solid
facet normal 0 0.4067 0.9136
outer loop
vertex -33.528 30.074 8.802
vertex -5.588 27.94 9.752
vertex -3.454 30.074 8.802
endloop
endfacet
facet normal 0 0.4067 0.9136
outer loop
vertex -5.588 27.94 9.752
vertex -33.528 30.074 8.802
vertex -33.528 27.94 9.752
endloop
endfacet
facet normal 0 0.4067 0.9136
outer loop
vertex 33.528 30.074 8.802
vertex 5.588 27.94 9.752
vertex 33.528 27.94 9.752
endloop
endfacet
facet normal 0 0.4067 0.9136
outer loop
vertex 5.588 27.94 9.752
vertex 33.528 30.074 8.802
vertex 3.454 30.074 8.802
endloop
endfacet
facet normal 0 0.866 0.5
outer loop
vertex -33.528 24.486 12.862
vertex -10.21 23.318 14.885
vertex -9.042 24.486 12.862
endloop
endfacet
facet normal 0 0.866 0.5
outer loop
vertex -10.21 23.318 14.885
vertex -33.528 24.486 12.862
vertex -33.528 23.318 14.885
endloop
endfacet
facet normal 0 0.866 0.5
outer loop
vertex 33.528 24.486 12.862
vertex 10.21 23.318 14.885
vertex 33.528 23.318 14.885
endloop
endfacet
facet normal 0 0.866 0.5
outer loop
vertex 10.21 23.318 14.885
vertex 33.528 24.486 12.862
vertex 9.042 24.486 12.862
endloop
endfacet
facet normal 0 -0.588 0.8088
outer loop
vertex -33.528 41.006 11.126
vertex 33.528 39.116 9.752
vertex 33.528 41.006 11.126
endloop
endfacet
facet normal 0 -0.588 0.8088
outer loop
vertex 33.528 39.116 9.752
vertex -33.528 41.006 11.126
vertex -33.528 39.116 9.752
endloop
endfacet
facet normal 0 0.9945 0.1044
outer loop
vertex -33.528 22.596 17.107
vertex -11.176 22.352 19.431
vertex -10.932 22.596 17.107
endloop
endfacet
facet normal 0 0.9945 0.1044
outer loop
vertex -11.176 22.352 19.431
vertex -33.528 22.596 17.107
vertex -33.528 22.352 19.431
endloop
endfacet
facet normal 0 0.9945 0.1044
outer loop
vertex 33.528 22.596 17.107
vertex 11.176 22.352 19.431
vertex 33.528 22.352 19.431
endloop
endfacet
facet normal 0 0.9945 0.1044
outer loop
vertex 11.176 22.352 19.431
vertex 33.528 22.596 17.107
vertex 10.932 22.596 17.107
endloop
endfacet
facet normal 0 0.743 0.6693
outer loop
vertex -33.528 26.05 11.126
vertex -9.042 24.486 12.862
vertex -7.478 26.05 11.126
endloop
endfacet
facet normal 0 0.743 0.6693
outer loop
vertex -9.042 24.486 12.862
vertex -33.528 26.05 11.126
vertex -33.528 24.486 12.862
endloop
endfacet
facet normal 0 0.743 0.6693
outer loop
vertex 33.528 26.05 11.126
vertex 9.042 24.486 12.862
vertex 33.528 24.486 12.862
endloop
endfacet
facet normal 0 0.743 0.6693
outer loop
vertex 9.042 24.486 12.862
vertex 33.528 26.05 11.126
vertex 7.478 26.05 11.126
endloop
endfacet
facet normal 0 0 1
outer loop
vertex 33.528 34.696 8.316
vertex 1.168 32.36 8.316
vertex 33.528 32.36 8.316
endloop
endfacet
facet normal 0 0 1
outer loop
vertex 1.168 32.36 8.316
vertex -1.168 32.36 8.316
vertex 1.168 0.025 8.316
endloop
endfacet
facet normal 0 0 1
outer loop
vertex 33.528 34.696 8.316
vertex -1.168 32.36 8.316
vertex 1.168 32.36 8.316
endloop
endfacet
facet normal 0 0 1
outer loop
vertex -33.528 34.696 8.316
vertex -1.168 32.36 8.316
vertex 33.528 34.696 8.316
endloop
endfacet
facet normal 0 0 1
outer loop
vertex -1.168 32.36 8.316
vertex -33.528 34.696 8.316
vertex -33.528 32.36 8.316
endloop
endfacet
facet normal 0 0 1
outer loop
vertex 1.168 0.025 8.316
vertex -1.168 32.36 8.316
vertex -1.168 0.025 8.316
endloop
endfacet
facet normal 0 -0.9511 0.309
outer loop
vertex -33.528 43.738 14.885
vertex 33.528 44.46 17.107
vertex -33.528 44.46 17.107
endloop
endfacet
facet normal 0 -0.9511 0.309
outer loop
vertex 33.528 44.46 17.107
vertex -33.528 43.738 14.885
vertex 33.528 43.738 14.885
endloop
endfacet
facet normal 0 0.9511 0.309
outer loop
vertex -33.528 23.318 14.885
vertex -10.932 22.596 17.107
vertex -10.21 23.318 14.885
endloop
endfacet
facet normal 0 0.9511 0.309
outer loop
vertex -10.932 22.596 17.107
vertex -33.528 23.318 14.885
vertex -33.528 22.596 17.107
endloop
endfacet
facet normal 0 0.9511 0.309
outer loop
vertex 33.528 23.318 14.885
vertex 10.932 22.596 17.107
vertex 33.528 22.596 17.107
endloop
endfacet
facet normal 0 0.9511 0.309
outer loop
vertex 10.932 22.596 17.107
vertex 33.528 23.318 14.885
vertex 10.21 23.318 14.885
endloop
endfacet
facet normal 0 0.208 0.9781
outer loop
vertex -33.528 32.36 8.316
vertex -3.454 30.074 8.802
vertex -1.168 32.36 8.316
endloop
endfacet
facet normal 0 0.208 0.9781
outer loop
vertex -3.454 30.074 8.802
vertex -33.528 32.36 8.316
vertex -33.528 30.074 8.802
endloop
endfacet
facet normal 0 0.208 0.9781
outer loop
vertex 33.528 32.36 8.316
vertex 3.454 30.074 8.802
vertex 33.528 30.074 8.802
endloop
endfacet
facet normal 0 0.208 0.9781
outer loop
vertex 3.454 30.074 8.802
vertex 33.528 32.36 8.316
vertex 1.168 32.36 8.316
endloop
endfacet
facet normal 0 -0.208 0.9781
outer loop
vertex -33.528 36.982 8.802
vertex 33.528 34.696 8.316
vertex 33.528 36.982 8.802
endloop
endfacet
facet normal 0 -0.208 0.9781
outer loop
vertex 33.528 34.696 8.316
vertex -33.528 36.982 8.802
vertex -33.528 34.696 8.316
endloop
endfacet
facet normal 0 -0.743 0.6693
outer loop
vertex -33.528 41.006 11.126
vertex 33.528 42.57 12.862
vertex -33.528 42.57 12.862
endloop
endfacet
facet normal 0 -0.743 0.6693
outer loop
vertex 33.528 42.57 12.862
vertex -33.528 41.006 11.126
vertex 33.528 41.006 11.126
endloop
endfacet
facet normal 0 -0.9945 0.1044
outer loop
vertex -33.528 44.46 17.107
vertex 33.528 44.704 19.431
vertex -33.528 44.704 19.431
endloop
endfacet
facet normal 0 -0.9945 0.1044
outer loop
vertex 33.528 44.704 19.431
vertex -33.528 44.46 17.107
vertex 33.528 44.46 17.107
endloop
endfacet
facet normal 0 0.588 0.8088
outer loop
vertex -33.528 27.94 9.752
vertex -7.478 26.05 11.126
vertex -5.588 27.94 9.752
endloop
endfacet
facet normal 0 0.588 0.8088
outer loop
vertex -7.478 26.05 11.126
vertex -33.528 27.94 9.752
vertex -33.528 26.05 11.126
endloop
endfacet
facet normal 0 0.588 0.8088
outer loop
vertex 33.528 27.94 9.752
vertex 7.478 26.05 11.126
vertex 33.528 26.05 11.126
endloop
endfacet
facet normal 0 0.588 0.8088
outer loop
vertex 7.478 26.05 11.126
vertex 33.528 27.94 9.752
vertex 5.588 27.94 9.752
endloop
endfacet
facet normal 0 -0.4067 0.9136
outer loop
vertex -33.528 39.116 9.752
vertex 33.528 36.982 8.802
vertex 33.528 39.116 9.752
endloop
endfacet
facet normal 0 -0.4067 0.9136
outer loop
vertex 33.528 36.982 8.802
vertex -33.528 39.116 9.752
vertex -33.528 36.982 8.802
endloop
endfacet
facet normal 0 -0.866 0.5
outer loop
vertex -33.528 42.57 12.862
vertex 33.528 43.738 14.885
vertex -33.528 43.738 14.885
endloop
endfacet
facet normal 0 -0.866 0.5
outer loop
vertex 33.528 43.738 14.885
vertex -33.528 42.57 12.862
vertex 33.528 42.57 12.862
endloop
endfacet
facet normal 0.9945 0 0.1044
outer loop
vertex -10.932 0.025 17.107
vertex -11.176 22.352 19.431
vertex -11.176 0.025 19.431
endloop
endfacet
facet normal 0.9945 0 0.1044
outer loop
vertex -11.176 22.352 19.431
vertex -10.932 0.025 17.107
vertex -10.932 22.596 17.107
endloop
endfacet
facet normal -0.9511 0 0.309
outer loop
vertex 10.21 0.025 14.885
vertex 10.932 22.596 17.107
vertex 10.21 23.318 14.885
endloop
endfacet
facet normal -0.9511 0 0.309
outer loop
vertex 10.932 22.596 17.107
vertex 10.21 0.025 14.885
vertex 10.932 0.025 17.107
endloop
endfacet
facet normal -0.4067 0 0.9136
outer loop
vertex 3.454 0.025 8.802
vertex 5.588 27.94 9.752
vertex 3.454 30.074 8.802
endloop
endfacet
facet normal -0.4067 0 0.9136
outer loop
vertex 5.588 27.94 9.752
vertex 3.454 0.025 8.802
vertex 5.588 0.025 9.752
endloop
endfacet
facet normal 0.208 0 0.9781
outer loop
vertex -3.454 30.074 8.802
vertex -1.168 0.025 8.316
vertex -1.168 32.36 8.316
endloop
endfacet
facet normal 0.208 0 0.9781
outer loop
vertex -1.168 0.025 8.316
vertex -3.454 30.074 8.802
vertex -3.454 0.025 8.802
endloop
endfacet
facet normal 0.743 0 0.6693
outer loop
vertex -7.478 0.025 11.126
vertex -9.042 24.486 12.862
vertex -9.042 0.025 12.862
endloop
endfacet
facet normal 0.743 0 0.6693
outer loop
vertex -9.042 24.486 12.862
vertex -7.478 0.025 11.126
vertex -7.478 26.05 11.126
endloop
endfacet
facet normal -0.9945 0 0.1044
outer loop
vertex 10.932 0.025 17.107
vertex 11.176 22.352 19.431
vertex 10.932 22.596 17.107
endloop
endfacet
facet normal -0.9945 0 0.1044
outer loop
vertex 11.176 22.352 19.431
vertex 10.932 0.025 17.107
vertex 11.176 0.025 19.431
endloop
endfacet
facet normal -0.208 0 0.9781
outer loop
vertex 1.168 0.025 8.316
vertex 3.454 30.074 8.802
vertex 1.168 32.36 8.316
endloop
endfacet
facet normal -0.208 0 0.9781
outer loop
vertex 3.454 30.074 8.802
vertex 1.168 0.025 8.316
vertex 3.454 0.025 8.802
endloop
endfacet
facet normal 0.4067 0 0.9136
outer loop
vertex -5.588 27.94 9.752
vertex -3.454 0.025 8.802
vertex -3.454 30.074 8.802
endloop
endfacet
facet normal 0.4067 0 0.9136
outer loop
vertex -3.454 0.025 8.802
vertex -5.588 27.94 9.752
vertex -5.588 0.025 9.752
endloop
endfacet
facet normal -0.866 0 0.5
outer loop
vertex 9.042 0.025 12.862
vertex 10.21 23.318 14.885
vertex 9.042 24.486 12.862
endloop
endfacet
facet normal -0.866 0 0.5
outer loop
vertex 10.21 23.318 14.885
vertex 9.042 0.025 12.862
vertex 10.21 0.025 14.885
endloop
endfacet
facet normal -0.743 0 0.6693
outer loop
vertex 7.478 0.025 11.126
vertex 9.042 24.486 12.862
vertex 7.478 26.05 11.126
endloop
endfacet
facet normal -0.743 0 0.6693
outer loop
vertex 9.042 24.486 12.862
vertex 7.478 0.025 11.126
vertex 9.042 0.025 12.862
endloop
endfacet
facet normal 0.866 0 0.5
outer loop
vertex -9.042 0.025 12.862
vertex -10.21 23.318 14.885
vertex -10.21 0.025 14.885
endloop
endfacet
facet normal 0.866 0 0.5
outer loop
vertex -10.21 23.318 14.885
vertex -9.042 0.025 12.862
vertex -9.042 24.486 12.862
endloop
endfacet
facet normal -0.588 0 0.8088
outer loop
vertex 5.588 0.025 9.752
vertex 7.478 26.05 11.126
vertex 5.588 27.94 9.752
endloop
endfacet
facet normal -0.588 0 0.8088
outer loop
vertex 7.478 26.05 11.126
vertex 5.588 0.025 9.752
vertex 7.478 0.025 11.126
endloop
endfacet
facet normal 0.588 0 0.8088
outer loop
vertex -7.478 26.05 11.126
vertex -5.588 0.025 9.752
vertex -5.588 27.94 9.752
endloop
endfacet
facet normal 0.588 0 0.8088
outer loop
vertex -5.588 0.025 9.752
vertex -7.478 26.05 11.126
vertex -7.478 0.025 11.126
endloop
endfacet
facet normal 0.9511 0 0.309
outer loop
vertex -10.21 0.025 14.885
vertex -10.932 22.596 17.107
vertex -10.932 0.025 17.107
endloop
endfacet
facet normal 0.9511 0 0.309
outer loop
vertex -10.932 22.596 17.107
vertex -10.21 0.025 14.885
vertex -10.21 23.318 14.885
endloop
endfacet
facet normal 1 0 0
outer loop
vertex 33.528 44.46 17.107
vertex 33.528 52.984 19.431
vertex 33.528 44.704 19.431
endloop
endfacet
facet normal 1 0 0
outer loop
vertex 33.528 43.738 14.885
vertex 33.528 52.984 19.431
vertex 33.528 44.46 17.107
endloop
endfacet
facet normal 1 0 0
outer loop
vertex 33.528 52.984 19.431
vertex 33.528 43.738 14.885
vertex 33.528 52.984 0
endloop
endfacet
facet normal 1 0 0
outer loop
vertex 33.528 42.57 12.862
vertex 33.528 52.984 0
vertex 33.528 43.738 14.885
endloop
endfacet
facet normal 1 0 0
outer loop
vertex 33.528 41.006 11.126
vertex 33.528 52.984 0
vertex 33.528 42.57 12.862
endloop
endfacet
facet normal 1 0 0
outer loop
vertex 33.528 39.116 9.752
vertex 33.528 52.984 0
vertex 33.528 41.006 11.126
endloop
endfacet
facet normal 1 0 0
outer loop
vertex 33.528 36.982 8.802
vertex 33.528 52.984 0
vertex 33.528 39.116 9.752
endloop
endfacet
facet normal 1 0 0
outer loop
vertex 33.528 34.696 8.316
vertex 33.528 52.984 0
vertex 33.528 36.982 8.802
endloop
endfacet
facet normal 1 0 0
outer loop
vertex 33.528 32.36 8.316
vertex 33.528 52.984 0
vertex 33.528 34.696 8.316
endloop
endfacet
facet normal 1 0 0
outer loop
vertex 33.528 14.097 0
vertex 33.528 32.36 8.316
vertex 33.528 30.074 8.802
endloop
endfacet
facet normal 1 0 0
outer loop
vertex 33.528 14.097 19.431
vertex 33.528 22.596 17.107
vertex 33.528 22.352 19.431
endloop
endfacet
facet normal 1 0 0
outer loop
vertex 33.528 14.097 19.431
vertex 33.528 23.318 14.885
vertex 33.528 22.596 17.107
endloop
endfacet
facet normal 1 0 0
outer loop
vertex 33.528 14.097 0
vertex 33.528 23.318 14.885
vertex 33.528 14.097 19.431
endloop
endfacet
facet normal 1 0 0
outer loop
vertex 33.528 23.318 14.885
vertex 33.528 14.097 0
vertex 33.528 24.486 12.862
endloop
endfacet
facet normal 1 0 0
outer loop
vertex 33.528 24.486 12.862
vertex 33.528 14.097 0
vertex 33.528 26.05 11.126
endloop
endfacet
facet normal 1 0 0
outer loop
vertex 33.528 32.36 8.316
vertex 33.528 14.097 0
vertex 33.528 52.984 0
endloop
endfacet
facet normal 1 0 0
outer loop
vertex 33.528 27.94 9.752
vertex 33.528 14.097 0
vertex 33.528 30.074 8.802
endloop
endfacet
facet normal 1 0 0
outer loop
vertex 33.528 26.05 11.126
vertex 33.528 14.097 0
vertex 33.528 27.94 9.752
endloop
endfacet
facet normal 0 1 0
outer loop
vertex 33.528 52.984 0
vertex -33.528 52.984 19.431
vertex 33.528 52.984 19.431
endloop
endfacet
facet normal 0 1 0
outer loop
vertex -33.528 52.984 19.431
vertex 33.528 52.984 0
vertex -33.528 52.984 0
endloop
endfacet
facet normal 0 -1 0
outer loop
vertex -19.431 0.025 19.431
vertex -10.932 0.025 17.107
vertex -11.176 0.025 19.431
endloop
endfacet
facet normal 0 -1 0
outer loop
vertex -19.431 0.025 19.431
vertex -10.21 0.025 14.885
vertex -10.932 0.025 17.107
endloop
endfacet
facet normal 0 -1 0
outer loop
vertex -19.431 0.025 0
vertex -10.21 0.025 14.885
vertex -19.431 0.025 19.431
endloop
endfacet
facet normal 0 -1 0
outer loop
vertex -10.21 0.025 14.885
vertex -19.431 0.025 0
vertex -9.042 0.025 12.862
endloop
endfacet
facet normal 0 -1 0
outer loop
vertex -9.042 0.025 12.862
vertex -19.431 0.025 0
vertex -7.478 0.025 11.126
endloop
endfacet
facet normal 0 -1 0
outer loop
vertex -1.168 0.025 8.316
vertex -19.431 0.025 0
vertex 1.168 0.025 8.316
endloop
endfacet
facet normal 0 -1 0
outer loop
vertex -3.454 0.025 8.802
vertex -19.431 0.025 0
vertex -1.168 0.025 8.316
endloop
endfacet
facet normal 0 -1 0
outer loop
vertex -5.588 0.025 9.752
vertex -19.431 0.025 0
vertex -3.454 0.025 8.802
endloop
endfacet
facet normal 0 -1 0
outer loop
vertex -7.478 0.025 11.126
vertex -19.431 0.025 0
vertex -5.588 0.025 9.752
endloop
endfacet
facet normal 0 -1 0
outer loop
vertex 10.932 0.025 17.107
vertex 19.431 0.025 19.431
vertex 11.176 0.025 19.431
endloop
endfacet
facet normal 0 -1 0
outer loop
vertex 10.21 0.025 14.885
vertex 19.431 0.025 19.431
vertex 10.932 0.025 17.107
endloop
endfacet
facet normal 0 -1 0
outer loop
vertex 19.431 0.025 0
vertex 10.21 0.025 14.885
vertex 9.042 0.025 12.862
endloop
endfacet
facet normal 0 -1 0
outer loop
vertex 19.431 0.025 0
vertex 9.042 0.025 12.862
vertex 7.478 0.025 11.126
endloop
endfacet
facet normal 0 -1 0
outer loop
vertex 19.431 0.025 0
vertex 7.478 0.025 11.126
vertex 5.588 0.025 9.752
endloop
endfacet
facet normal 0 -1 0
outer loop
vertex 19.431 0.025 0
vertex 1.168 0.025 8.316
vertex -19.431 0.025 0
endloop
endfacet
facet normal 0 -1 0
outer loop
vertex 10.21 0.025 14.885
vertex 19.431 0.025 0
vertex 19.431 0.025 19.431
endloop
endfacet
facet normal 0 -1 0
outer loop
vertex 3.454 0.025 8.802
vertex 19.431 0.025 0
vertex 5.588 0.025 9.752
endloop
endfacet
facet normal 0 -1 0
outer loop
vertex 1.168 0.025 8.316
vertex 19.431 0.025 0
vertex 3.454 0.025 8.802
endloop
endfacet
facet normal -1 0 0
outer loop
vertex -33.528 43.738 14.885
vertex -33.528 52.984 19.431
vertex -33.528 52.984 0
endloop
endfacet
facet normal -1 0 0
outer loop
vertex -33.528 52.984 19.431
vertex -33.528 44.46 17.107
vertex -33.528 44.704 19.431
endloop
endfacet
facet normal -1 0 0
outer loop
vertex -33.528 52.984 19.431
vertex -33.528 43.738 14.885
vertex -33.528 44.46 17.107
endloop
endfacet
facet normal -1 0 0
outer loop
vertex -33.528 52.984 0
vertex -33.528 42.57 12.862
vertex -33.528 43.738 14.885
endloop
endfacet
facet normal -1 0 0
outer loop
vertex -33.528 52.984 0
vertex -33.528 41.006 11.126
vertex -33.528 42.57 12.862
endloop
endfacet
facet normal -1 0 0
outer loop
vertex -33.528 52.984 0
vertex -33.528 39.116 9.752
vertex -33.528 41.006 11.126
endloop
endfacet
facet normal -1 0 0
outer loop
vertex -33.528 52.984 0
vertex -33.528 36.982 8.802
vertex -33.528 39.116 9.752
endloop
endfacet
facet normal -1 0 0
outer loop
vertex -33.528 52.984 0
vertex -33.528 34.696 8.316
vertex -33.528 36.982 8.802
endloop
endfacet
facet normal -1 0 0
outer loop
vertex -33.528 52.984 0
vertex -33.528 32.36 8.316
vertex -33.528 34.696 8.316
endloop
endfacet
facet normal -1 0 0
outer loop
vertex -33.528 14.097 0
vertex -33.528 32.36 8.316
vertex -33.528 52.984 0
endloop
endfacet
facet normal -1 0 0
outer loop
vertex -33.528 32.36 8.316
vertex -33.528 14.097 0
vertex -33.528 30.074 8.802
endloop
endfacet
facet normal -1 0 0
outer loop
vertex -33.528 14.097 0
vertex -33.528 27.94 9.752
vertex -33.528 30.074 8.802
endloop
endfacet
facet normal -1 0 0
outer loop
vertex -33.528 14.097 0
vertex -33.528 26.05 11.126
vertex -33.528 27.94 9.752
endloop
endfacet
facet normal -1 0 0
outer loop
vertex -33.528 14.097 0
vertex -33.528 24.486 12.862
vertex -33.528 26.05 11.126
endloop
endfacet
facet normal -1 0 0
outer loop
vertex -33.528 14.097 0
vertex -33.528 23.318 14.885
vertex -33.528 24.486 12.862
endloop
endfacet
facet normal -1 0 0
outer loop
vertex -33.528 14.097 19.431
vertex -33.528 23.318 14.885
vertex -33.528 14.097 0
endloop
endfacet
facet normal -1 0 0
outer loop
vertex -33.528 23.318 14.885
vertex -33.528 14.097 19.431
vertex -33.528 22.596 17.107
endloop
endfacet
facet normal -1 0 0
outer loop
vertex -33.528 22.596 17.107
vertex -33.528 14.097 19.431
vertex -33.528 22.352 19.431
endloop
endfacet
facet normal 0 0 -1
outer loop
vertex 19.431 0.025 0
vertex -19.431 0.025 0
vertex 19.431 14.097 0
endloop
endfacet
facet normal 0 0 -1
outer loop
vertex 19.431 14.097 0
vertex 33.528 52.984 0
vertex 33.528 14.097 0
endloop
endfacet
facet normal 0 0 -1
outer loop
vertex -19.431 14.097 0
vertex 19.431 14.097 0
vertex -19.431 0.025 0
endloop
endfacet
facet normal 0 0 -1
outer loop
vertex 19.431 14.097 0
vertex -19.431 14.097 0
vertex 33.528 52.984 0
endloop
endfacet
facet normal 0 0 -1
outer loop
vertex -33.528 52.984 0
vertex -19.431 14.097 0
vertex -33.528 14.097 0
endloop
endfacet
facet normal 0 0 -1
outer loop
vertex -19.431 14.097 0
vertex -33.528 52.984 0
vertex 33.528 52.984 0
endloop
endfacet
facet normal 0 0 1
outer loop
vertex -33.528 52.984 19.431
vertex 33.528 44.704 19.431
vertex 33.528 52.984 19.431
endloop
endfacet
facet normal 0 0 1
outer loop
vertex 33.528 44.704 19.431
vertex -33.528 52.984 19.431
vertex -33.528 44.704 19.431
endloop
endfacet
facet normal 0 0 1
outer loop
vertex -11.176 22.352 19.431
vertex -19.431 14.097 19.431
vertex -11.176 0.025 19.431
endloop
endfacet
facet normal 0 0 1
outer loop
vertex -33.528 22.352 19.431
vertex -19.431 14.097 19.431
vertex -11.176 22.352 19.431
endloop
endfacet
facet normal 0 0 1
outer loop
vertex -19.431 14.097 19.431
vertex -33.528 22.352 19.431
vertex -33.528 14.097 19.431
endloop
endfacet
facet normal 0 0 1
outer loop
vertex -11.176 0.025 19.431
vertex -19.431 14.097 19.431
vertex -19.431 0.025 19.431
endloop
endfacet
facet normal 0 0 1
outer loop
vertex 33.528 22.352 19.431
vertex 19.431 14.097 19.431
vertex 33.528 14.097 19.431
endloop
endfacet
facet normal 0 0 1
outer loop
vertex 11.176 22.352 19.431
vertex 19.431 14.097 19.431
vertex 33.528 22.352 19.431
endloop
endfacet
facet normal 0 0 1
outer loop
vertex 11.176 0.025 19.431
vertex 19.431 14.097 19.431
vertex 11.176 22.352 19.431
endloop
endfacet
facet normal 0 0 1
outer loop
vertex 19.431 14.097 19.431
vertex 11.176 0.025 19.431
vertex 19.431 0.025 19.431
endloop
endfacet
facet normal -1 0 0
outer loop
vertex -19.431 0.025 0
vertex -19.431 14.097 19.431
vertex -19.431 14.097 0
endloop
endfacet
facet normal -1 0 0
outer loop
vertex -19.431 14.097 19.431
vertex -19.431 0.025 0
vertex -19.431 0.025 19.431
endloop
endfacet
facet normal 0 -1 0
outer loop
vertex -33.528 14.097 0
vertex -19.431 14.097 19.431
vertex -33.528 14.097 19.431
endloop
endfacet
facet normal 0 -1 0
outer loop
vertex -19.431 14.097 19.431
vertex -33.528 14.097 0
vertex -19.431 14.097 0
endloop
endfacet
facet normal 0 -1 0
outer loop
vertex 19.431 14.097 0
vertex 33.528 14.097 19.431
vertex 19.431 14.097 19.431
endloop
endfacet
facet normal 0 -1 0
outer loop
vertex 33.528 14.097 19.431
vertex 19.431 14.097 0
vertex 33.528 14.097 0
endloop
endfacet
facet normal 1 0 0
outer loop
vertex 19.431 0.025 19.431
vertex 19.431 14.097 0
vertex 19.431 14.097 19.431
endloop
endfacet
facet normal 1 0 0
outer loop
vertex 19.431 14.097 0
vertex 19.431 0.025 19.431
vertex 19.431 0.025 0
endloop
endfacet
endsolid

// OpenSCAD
include <../Vitamins/Pipe.scad>;

wall = 0;
tee = TeeThreeQuarterInch;

scale([25.4, 25.4, 25.4])
rotate([-90,0,0])
translate([0,-lookup(TeeRimDiameter, tee)/2 - wall,wall])
difference() {

  translate([-lookup(TeeWidth, tee)/2 - wall,0,+0.001])
  #cube([3_4_tee_width + wall*2,
         3_4_tee_rim_od/2 + wall,
         3_4_tee_height + (3_4_tee_rim_od - 3_4_tee_diameter)/2 + wall*2]);

  #union() {
    translate([-3_4_tee_width/2 - wall - 0.1,0,3_4_tee_center_z])
    rotate([0,90,0])
    cylinder(r=3_4_tee_id/2, h=3_4_tee_width + wall*2 + 0.2, $fn=30);

    translate([0,0,-0.1])
    cylinder(r=3_4_tee_id/2, h=3_4_tee_height - 3_4_tee_diameter/2 + 0.1, $fn=30);
  }

  translate([-3_4_tee_rim_od/2 - wall -1, - 0.1,3_4_tee_center_z - 3_4_tee_rim_od/2 - wall -1])
  #cube([1,1,1]);

  translate([3_4_tee_rim_od/2 + wall, - 0.1,3_4_tee_center_z - 3_4_tee_rim_od/2 - wall -1])
  #cube([1,1,1]);

  %3_4_tee();
}
